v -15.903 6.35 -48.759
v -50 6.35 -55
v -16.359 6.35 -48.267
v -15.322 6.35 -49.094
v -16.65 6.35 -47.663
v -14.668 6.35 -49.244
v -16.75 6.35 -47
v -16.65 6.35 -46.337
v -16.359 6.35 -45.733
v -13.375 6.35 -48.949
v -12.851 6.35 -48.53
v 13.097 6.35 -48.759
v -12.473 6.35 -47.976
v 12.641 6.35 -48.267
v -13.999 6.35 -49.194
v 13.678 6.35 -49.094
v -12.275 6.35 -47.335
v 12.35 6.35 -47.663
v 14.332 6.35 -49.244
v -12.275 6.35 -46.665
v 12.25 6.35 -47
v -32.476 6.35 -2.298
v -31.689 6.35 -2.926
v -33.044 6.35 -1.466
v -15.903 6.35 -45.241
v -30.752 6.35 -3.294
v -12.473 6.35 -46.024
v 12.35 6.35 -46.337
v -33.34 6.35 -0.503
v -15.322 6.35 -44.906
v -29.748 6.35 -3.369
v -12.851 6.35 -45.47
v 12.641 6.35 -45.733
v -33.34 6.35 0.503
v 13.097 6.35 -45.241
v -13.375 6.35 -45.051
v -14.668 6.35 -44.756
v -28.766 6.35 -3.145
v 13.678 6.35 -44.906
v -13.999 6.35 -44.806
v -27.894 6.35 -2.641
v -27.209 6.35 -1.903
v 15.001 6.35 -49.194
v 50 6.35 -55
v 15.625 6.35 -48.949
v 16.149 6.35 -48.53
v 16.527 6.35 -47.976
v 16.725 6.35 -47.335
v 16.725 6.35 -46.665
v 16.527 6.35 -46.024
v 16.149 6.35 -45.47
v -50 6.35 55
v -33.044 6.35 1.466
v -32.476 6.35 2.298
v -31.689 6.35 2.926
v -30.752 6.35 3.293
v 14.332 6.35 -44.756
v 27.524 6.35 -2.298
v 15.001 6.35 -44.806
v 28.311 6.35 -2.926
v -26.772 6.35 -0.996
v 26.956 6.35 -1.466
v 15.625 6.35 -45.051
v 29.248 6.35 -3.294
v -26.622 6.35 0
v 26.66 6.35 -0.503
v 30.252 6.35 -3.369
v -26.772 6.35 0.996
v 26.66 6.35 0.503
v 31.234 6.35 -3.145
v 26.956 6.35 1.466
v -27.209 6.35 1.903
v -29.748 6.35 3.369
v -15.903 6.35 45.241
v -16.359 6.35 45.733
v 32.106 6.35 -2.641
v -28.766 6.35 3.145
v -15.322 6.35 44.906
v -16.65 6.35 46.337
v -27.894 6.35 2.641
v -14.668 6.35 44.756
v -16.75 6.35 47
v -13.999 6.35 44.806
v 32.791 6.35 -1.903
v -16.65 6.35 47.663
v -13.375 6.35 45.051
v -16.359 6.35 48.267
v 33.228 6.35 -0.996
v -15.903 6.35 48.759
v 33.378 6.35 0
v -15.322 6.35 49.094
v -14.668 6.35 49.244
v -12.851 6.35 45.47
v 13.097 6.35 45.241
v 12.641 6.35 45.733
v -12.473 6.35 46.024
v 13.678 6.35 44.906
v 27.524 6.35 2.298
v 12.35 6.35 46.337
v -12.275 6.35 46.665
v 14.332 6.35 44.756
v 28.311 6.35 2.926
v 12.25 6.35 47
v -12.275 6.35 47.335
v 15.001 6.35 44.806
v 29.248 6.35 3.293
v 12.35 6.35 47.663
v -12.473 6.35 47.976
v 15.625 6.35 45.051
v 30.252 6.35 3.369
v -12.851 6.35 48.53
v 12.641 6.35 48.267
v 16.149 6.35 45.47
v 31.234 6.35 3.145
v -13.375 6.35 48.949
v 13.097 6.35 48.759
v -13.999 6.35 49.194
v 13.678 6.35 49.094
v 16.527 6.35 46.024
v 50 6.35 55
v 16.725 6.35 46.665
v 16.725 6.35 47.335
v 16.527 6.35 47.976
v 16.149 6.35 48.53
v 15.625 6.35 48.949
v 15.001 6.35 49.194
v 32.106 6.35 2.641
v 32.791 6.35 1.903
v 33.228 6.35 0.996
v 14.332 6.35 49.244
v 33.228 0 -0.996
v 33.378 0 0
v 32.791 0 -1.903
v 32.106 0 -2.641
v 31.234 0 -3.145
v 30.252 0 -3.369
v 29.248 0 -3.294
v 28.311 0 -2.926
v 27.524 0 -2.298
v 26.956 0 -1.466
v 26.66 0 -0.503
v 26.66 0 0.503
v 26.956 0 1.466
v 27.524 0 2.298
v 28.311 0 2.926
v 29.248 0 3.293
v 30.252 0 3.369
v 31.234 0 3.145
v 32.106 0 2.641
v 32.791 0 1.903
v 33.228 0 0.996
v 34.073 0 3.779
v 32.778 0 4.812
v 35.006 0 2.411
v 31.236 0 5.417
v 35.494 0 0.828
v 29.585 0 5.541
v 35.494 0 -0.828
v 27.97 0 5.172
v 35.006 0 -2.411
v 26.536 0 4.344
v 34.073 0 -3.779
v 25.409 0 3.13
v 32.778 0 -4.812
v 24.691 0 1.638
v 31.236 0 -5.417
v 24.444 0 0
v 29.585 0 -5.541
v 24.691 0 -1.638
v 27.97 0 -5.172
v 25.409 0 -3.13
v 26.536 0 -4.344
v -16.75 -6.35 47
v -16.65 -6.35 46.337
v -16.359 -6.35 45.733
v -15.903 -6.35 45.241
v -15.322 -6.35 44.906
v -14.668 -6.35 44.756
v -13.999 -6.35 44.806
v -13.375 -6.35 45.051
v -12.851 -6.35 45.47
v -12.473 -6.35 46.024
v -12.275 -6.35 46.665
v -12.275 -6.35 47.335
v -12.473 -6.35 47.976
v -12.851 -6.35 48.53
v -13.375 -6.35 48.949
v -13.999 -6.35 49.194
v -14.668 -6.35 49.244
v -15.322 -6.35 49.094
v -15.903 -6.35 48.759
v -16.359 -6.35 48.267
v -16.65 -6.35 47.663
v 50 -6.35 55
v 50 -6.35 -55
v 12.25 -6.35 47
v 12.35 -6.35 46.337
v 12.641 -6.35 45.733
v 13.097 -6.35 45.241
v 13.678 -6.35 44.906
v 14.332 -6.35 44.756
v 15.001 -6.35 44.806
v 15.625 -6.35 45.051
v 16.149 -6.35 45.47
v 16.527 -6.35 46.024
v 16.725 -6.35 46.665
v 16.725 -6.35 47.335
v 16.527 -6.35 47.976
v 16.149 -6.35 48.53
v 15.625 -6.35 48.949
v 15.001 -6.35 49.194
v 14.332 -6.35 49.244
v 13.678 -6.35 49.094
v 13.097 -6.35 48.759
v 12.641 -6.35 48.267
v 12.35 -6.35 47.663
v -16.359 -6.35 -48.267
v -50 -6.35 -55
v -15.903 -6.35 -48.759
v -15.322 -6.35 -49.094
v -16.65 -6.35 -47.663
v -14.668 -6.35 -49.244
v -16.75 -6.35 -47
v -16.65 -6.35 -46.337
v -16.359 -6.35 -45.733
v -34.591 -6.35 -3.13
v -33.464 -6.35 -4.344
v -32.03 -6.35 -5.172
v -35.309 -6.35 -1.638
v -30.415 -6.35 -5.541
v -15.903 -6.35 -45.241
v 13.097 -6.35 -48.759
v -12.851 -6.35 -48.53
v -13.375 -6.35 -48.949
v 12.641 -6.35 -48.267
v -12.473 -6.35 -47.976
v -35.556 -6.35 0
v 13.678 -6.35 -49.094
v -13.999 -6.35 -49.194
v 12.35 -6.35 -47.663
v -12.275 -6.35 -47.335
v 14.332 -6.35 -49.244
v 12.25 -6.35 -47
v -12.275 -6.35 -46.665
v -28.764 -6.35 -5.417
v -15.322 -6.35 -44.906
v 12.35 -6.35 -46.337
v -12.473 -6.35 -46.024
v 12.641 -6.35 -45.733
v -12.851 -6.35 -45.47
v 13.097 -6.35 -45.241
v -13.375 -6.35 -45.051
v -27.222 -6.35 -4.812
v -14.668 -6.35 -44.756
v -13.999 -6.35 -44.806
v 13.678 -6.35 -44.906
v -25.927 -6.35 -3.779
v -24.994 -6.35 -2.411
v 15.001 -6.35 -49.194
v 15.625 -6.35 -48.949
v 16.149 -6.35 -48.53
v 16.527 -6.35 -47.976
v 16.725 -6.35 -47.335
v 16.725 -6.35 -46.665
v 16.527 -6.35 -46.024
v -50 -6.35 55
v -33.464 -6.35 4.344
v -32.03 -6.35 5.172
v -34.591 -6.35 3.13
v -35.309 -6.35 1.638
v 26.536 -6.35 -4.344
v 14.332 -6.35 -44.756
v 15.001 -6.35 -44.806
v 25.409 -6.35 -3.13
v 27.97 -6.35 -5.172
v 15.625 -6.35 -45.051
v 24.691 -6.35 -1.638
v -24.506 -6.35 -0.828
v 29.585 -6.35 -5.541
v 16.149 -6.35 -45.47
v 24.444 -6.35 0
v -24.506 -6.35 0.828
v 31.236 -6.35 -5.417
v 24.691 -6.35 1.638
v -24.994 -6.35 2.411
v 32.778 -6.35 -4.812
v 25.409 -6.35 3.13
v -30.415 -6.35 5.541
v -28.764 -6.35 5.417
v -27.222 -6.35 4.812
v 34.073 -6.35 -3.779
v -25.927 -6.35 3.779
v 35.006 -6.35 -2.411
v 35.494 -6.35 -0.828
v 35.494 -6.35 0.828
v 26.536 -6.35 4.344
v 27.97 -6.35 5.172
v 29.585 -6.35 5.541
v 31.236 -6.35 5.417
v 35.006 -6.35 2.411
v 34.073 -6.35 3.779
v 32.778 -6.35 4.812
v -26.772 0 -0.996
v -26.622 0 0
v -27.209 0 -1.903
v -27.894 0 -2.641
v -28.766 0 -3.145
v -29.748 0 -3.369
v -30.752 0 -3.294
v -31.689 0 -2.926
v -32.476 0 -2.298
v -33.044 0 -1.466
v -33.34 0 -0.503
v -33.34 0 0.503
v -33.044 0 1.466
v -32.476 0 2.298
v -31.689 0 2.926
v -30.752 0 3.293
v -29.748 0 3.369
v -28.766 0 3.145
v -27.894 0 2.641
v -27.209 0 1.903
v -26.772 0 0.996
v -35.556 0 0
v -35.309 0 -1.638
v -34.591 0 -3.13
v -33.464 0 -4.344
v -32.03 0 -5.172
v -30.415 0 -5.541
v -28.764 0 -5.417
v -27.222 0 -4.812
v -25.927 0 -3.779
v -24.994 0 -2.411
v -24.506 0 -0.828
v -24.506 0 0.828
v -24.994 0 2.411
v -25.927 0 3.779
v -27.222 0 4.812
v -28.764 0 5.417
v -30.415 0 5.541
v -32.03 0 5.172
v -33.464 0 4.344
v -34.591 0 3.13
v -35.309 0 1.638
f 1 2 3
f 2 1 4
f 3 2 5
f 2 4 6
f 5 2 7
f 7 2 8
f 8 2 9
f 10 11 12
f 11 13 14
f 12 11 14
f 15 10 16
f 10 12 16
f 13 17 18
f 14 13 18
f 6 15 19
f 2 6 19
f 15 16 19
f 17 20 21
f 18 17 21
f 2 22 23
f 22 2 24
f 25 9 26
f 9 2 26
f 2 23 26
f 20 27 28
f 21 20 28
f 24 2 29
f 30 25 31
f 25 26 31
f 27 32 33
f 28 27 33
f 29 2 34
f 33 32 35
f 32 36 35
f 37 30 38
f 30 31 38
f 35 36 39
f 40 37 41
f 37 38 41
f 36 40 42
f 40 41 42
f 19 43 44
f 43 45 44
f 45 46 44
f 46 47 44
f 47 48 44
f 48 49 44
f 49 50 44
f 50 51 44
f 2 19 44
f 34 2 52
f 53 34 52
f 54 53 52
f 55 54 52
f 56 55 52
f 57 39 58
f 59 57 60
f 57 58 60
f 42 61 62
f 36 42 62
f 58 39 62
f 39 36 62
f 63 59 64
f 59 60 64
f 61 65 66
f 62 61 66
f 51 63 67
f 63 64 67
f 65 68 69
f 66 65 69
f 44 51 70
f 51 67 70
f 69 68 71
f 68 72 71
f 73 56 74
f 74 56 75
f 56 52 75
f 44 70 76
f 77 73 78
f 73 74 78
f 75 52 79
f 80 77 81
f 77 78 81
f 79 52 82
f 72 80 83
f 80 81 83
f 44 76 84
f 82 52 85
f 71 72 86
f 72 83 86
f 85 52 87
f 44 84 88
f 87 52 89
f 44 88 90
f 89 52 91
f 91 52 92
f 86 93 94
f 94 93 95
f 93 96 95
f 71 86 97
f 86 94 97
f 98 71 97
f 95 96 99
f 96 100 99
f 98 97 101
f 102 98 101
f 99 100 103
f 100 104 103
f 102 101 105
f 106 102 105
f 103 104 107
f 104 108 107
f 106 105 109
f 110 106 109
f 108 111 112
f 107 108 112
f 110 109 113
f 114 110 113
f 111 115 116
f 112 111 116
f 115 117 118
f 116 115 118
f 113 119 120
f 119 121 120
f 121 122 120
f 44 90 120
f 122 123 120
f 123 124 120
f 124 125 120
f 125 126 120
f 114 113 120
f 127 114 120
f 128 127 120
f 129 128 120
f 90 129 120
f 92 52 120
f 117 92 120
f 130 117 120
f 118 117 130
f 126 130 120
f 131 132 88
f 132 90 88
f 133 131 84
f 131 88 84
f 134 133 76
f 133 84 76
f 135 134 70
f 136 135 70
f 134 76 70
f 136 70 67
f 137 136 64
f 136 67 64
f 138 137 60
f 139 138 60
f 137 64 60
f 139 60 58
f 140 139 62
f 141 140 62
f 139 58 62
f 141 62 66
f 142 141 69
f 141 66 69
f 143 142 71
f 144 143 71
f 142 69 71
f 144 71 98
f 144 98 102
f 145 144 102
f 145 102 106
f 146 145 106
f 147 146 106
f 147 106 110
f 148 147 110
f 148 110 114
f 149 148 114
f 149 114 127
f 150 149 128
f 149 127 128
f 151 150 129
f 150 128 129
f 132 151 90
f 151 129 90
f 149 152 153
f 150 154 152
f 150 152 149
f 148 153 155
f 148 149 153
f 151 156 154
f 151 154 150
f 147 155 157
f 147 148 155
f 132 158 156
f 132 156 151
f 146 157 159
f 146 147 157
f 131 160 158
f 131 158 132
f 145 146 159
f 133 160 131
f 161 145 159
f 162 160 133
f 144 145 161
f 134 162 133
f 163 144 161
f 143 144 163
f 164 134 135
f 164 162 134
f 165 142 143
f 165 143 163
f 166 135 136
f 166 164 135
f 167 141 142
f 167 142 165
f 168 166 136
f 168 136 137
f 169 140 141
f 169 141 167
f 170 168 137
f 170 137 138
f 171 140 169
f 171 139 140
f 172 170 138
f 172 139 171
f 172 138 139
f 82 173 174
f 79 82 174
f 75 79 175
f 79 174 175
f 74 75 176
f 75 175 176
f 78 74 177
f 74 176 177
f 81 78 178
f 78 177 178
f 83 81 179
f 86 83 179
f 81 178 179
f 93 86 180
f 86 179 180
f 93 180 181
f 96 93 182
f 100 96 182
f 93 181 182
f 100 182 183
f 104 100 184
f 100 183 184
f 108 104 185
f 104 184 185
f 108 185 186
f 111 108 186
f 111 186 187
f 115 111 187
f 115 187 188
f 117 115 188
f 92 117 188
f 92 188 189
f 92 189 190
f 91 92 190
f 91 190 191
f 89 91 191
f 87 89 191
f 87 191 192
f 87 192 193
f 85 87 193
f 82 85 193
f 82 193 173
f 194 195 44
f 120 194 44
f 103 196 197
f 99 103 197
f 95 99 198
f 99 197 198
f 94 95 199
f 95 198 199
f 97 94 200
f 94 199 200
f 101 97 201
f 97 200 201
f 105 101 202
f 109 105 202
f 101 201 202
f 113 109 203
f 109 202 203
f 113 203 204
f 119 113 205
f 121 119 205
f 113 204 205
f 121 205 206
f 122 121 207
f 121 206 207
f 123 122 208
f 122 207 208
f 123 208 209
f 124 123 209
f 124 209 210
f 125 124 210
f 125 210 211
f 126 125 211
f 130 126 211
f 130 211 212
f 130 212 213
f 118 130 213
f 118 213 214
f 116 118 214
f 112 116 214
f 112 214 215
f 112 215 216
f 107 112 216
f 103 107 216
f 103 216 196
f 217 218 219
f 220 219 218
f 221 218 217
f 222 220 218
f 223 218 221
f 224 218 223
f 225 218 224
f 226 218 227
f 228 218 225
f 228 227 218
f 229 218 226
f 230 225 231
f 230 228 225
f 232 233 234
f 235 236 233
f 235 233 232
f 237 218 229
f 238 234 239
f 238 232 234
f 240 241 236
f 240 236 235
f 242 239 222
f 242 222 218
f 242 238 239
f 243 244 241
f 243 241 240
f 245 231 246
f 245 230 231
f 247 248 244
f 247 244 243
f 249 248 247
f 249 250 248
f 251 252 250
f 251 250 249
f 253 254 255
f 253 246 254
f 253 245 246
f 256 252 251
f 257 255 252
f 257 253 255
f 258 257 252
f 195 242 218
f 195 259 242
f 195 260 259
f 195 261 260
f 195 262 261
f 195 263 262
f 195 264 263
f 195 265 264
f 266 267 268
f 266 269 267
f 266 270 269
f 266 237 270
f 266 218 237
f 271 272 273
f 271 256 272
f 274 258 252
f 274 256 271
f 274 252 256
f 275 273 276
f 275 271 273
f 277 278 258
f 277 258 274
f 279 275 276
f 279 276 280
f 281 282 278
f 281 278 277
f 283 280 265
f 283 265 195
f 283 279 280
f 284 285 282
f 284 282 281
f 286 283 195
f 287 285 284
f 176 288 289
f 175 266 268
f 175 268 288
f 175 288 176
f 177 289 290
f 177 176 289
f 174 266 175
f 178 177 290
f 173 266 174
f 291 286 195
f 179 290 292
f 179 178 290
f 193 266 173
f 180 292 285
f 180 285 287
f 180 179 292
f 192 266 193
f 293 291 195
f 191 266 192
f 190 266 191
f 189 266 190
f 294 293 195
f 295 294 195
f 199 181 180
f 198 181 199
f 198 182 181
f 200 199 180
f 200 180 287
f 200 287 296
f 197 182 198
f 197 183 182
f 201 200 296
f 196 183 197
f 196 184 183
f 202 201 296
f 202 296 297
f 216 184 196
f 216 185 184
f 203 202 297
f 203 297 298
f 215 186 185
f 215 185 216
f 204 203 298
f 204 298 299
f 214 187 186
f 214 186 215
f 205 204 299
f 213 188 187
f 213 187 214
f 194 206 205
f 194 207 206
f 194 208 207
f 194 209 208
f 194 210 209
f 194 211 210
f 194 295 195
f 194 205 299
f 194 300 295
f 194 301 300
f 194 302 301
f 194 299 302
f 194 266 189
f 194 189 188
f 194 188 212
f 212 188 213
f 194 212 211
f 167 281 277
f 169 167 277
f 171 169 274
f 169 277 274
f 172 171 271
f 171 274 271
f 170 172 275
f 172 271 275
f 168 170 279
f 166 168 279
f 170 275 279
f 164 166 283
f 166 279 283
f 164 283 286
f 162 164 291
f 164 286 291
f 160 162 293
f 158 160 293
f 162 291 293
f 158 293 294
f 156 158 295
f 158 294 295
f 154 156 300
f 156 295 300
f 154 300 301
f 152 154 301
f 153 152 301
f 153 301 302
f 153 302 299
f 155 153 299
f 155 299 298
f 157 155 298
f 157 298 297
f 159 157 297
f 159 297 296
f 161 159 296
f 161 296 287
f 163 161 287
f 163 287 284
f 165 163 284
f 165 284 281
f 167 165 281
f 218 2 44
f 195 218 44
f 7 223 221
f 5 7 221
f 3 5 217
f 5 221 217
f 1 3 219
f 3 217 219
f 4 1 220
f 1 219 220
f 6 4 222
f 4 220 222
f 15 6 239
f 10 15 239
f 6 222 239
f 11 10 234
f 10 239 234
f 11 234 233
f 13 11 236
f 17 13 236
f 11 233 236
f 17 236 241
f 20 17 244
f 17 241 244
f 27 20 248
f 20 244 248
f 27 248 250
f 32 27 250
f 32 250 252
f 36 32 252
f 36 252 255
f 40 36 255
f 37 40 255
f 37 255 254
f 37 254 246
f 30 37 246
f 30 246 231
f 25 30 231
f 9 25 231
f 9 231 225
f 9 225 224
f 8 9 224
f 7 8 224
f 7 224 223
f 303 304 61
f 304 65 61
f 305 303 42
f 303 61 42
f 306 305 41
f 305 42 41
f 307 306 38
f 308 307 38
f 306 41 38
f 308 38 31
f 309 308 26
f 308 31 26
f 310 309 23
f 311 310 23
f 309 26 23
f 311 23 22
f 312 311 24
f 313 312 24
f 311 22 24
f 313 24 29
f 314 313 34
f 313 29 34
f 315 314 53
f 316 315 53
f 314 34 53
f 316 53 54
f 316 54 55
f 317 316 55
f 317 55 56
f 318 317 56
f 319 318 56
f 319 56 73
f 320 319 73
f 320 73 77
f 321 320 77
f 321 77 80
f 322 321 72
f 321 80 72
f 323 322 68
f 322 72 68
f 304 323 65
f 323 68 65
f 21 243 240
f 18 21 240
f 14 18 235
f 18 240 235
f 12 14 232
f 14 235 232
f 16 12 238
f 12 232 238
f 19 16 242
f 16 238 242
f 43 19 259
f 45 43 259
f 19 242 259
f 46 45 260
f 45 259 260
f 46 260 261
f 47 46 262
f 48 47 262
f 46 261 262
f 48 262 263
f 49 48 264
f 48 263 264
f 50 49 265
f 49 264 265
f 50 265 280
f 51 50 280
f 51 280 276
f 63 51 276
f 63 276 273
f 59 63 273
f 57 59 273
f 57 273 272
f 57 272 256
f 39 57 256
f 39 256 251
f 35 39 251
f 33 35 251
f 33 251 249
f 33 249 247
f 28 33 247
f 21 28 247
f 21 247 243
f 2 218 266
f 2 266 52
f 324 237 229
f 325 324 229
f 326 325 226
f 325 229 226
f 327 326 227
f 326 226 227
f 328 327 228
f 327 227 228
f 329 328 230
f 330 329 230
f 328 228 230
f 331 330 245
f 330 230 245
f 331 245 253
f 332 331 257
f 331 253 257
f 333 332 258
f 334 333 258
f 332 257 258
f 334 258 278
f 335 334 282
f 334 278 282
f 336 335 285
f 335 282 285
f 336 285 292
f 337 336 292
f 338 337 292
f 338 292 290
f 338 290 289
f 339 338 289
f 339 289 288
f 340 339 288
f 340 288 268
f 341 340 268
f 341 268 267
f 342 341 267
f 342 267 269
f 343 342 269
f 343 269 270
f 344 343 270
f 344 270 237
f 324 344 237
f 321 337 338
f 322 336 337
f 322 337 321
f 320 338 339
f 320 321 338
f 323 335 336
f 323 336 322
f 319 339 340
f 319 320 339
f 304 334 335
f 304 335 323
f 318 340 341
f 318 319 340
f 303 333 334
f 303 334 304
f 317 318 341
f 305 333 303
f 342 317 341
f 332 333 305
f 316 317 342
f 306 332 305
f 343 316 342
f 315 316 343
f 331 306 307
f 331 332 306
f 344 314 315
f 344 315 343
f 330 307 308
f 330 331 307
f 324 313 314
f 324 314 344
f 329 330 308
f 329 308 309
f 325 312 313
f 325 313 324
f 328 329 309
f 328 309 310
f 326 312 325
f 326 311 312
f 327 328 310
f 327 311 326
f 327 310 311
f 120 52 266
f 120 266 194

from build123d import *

# Parameters (mm, degrees)
SKETCH1_W                                        = 100
SKETCH1_H                                        = 12.7
BOSS_EXTRUDE1_DEPTH                              = 55
M4_CLEARANCE_HOLE1_D                             = 4.5
CBORE_FOR_1_4_SOCKET_HEAD_CAP_SCREW1_D           = 6.7564
CBORE_FOR_1_4_SOCKET_HEAD_CAP_SCREW1_CBORE_D     = 11.1125
CBORE_FOR_1_4_SOCKET_HEAD_CAP_SCREW1_CBORE_DEPTH = 6.35


with BuildPart() as part:
    # Sketch1 → Boss-Extrude1 (new, symmetric)
    with BuildSketch(Plane.XY):
        Rectangle(SKETCH1_W, SKETCH1_H)
    extrude(amount=BOSS_EXTRUDE1_DEPTH, both=True)

    # M4 Clearance Hole1 (through all)
    with Locations(Plane(origin=(0, 6.35, 0), x_dir=(1, 0, 0), z_dir=(0, 1, 0))):
        with Locations((14.5, -47), (-14.5, -47), (-14.5, 47), (14.5, 47)):
            Hole(M4_CLEARANCE_HOLE1_D / 2)

    # CBORE for 1/4 Socket Head Cap Screw1 (through all)
    with Locations(Plane(origin=(0, -6.35, 0), x_dir=(-1, 0, 0), z_dir=(0, -1, 0))):
        with Locations((30.000007891, 1.671e-06), (-29.999992109, 1.671e-06)):
            CounterBoreHole(CBORE_FOR_1_4_SOCKET_HEAD_CAP_SCREW1_D / 2, CBORE_FOR_1_4_SOCKET_HEAD_CAP_SCREW1_CBORE_D / 2, CBORE_FOR_1_4_SOCKET_HEAD_CAP_SCREW1_CBORE_DEPTH)


solid = part.part
